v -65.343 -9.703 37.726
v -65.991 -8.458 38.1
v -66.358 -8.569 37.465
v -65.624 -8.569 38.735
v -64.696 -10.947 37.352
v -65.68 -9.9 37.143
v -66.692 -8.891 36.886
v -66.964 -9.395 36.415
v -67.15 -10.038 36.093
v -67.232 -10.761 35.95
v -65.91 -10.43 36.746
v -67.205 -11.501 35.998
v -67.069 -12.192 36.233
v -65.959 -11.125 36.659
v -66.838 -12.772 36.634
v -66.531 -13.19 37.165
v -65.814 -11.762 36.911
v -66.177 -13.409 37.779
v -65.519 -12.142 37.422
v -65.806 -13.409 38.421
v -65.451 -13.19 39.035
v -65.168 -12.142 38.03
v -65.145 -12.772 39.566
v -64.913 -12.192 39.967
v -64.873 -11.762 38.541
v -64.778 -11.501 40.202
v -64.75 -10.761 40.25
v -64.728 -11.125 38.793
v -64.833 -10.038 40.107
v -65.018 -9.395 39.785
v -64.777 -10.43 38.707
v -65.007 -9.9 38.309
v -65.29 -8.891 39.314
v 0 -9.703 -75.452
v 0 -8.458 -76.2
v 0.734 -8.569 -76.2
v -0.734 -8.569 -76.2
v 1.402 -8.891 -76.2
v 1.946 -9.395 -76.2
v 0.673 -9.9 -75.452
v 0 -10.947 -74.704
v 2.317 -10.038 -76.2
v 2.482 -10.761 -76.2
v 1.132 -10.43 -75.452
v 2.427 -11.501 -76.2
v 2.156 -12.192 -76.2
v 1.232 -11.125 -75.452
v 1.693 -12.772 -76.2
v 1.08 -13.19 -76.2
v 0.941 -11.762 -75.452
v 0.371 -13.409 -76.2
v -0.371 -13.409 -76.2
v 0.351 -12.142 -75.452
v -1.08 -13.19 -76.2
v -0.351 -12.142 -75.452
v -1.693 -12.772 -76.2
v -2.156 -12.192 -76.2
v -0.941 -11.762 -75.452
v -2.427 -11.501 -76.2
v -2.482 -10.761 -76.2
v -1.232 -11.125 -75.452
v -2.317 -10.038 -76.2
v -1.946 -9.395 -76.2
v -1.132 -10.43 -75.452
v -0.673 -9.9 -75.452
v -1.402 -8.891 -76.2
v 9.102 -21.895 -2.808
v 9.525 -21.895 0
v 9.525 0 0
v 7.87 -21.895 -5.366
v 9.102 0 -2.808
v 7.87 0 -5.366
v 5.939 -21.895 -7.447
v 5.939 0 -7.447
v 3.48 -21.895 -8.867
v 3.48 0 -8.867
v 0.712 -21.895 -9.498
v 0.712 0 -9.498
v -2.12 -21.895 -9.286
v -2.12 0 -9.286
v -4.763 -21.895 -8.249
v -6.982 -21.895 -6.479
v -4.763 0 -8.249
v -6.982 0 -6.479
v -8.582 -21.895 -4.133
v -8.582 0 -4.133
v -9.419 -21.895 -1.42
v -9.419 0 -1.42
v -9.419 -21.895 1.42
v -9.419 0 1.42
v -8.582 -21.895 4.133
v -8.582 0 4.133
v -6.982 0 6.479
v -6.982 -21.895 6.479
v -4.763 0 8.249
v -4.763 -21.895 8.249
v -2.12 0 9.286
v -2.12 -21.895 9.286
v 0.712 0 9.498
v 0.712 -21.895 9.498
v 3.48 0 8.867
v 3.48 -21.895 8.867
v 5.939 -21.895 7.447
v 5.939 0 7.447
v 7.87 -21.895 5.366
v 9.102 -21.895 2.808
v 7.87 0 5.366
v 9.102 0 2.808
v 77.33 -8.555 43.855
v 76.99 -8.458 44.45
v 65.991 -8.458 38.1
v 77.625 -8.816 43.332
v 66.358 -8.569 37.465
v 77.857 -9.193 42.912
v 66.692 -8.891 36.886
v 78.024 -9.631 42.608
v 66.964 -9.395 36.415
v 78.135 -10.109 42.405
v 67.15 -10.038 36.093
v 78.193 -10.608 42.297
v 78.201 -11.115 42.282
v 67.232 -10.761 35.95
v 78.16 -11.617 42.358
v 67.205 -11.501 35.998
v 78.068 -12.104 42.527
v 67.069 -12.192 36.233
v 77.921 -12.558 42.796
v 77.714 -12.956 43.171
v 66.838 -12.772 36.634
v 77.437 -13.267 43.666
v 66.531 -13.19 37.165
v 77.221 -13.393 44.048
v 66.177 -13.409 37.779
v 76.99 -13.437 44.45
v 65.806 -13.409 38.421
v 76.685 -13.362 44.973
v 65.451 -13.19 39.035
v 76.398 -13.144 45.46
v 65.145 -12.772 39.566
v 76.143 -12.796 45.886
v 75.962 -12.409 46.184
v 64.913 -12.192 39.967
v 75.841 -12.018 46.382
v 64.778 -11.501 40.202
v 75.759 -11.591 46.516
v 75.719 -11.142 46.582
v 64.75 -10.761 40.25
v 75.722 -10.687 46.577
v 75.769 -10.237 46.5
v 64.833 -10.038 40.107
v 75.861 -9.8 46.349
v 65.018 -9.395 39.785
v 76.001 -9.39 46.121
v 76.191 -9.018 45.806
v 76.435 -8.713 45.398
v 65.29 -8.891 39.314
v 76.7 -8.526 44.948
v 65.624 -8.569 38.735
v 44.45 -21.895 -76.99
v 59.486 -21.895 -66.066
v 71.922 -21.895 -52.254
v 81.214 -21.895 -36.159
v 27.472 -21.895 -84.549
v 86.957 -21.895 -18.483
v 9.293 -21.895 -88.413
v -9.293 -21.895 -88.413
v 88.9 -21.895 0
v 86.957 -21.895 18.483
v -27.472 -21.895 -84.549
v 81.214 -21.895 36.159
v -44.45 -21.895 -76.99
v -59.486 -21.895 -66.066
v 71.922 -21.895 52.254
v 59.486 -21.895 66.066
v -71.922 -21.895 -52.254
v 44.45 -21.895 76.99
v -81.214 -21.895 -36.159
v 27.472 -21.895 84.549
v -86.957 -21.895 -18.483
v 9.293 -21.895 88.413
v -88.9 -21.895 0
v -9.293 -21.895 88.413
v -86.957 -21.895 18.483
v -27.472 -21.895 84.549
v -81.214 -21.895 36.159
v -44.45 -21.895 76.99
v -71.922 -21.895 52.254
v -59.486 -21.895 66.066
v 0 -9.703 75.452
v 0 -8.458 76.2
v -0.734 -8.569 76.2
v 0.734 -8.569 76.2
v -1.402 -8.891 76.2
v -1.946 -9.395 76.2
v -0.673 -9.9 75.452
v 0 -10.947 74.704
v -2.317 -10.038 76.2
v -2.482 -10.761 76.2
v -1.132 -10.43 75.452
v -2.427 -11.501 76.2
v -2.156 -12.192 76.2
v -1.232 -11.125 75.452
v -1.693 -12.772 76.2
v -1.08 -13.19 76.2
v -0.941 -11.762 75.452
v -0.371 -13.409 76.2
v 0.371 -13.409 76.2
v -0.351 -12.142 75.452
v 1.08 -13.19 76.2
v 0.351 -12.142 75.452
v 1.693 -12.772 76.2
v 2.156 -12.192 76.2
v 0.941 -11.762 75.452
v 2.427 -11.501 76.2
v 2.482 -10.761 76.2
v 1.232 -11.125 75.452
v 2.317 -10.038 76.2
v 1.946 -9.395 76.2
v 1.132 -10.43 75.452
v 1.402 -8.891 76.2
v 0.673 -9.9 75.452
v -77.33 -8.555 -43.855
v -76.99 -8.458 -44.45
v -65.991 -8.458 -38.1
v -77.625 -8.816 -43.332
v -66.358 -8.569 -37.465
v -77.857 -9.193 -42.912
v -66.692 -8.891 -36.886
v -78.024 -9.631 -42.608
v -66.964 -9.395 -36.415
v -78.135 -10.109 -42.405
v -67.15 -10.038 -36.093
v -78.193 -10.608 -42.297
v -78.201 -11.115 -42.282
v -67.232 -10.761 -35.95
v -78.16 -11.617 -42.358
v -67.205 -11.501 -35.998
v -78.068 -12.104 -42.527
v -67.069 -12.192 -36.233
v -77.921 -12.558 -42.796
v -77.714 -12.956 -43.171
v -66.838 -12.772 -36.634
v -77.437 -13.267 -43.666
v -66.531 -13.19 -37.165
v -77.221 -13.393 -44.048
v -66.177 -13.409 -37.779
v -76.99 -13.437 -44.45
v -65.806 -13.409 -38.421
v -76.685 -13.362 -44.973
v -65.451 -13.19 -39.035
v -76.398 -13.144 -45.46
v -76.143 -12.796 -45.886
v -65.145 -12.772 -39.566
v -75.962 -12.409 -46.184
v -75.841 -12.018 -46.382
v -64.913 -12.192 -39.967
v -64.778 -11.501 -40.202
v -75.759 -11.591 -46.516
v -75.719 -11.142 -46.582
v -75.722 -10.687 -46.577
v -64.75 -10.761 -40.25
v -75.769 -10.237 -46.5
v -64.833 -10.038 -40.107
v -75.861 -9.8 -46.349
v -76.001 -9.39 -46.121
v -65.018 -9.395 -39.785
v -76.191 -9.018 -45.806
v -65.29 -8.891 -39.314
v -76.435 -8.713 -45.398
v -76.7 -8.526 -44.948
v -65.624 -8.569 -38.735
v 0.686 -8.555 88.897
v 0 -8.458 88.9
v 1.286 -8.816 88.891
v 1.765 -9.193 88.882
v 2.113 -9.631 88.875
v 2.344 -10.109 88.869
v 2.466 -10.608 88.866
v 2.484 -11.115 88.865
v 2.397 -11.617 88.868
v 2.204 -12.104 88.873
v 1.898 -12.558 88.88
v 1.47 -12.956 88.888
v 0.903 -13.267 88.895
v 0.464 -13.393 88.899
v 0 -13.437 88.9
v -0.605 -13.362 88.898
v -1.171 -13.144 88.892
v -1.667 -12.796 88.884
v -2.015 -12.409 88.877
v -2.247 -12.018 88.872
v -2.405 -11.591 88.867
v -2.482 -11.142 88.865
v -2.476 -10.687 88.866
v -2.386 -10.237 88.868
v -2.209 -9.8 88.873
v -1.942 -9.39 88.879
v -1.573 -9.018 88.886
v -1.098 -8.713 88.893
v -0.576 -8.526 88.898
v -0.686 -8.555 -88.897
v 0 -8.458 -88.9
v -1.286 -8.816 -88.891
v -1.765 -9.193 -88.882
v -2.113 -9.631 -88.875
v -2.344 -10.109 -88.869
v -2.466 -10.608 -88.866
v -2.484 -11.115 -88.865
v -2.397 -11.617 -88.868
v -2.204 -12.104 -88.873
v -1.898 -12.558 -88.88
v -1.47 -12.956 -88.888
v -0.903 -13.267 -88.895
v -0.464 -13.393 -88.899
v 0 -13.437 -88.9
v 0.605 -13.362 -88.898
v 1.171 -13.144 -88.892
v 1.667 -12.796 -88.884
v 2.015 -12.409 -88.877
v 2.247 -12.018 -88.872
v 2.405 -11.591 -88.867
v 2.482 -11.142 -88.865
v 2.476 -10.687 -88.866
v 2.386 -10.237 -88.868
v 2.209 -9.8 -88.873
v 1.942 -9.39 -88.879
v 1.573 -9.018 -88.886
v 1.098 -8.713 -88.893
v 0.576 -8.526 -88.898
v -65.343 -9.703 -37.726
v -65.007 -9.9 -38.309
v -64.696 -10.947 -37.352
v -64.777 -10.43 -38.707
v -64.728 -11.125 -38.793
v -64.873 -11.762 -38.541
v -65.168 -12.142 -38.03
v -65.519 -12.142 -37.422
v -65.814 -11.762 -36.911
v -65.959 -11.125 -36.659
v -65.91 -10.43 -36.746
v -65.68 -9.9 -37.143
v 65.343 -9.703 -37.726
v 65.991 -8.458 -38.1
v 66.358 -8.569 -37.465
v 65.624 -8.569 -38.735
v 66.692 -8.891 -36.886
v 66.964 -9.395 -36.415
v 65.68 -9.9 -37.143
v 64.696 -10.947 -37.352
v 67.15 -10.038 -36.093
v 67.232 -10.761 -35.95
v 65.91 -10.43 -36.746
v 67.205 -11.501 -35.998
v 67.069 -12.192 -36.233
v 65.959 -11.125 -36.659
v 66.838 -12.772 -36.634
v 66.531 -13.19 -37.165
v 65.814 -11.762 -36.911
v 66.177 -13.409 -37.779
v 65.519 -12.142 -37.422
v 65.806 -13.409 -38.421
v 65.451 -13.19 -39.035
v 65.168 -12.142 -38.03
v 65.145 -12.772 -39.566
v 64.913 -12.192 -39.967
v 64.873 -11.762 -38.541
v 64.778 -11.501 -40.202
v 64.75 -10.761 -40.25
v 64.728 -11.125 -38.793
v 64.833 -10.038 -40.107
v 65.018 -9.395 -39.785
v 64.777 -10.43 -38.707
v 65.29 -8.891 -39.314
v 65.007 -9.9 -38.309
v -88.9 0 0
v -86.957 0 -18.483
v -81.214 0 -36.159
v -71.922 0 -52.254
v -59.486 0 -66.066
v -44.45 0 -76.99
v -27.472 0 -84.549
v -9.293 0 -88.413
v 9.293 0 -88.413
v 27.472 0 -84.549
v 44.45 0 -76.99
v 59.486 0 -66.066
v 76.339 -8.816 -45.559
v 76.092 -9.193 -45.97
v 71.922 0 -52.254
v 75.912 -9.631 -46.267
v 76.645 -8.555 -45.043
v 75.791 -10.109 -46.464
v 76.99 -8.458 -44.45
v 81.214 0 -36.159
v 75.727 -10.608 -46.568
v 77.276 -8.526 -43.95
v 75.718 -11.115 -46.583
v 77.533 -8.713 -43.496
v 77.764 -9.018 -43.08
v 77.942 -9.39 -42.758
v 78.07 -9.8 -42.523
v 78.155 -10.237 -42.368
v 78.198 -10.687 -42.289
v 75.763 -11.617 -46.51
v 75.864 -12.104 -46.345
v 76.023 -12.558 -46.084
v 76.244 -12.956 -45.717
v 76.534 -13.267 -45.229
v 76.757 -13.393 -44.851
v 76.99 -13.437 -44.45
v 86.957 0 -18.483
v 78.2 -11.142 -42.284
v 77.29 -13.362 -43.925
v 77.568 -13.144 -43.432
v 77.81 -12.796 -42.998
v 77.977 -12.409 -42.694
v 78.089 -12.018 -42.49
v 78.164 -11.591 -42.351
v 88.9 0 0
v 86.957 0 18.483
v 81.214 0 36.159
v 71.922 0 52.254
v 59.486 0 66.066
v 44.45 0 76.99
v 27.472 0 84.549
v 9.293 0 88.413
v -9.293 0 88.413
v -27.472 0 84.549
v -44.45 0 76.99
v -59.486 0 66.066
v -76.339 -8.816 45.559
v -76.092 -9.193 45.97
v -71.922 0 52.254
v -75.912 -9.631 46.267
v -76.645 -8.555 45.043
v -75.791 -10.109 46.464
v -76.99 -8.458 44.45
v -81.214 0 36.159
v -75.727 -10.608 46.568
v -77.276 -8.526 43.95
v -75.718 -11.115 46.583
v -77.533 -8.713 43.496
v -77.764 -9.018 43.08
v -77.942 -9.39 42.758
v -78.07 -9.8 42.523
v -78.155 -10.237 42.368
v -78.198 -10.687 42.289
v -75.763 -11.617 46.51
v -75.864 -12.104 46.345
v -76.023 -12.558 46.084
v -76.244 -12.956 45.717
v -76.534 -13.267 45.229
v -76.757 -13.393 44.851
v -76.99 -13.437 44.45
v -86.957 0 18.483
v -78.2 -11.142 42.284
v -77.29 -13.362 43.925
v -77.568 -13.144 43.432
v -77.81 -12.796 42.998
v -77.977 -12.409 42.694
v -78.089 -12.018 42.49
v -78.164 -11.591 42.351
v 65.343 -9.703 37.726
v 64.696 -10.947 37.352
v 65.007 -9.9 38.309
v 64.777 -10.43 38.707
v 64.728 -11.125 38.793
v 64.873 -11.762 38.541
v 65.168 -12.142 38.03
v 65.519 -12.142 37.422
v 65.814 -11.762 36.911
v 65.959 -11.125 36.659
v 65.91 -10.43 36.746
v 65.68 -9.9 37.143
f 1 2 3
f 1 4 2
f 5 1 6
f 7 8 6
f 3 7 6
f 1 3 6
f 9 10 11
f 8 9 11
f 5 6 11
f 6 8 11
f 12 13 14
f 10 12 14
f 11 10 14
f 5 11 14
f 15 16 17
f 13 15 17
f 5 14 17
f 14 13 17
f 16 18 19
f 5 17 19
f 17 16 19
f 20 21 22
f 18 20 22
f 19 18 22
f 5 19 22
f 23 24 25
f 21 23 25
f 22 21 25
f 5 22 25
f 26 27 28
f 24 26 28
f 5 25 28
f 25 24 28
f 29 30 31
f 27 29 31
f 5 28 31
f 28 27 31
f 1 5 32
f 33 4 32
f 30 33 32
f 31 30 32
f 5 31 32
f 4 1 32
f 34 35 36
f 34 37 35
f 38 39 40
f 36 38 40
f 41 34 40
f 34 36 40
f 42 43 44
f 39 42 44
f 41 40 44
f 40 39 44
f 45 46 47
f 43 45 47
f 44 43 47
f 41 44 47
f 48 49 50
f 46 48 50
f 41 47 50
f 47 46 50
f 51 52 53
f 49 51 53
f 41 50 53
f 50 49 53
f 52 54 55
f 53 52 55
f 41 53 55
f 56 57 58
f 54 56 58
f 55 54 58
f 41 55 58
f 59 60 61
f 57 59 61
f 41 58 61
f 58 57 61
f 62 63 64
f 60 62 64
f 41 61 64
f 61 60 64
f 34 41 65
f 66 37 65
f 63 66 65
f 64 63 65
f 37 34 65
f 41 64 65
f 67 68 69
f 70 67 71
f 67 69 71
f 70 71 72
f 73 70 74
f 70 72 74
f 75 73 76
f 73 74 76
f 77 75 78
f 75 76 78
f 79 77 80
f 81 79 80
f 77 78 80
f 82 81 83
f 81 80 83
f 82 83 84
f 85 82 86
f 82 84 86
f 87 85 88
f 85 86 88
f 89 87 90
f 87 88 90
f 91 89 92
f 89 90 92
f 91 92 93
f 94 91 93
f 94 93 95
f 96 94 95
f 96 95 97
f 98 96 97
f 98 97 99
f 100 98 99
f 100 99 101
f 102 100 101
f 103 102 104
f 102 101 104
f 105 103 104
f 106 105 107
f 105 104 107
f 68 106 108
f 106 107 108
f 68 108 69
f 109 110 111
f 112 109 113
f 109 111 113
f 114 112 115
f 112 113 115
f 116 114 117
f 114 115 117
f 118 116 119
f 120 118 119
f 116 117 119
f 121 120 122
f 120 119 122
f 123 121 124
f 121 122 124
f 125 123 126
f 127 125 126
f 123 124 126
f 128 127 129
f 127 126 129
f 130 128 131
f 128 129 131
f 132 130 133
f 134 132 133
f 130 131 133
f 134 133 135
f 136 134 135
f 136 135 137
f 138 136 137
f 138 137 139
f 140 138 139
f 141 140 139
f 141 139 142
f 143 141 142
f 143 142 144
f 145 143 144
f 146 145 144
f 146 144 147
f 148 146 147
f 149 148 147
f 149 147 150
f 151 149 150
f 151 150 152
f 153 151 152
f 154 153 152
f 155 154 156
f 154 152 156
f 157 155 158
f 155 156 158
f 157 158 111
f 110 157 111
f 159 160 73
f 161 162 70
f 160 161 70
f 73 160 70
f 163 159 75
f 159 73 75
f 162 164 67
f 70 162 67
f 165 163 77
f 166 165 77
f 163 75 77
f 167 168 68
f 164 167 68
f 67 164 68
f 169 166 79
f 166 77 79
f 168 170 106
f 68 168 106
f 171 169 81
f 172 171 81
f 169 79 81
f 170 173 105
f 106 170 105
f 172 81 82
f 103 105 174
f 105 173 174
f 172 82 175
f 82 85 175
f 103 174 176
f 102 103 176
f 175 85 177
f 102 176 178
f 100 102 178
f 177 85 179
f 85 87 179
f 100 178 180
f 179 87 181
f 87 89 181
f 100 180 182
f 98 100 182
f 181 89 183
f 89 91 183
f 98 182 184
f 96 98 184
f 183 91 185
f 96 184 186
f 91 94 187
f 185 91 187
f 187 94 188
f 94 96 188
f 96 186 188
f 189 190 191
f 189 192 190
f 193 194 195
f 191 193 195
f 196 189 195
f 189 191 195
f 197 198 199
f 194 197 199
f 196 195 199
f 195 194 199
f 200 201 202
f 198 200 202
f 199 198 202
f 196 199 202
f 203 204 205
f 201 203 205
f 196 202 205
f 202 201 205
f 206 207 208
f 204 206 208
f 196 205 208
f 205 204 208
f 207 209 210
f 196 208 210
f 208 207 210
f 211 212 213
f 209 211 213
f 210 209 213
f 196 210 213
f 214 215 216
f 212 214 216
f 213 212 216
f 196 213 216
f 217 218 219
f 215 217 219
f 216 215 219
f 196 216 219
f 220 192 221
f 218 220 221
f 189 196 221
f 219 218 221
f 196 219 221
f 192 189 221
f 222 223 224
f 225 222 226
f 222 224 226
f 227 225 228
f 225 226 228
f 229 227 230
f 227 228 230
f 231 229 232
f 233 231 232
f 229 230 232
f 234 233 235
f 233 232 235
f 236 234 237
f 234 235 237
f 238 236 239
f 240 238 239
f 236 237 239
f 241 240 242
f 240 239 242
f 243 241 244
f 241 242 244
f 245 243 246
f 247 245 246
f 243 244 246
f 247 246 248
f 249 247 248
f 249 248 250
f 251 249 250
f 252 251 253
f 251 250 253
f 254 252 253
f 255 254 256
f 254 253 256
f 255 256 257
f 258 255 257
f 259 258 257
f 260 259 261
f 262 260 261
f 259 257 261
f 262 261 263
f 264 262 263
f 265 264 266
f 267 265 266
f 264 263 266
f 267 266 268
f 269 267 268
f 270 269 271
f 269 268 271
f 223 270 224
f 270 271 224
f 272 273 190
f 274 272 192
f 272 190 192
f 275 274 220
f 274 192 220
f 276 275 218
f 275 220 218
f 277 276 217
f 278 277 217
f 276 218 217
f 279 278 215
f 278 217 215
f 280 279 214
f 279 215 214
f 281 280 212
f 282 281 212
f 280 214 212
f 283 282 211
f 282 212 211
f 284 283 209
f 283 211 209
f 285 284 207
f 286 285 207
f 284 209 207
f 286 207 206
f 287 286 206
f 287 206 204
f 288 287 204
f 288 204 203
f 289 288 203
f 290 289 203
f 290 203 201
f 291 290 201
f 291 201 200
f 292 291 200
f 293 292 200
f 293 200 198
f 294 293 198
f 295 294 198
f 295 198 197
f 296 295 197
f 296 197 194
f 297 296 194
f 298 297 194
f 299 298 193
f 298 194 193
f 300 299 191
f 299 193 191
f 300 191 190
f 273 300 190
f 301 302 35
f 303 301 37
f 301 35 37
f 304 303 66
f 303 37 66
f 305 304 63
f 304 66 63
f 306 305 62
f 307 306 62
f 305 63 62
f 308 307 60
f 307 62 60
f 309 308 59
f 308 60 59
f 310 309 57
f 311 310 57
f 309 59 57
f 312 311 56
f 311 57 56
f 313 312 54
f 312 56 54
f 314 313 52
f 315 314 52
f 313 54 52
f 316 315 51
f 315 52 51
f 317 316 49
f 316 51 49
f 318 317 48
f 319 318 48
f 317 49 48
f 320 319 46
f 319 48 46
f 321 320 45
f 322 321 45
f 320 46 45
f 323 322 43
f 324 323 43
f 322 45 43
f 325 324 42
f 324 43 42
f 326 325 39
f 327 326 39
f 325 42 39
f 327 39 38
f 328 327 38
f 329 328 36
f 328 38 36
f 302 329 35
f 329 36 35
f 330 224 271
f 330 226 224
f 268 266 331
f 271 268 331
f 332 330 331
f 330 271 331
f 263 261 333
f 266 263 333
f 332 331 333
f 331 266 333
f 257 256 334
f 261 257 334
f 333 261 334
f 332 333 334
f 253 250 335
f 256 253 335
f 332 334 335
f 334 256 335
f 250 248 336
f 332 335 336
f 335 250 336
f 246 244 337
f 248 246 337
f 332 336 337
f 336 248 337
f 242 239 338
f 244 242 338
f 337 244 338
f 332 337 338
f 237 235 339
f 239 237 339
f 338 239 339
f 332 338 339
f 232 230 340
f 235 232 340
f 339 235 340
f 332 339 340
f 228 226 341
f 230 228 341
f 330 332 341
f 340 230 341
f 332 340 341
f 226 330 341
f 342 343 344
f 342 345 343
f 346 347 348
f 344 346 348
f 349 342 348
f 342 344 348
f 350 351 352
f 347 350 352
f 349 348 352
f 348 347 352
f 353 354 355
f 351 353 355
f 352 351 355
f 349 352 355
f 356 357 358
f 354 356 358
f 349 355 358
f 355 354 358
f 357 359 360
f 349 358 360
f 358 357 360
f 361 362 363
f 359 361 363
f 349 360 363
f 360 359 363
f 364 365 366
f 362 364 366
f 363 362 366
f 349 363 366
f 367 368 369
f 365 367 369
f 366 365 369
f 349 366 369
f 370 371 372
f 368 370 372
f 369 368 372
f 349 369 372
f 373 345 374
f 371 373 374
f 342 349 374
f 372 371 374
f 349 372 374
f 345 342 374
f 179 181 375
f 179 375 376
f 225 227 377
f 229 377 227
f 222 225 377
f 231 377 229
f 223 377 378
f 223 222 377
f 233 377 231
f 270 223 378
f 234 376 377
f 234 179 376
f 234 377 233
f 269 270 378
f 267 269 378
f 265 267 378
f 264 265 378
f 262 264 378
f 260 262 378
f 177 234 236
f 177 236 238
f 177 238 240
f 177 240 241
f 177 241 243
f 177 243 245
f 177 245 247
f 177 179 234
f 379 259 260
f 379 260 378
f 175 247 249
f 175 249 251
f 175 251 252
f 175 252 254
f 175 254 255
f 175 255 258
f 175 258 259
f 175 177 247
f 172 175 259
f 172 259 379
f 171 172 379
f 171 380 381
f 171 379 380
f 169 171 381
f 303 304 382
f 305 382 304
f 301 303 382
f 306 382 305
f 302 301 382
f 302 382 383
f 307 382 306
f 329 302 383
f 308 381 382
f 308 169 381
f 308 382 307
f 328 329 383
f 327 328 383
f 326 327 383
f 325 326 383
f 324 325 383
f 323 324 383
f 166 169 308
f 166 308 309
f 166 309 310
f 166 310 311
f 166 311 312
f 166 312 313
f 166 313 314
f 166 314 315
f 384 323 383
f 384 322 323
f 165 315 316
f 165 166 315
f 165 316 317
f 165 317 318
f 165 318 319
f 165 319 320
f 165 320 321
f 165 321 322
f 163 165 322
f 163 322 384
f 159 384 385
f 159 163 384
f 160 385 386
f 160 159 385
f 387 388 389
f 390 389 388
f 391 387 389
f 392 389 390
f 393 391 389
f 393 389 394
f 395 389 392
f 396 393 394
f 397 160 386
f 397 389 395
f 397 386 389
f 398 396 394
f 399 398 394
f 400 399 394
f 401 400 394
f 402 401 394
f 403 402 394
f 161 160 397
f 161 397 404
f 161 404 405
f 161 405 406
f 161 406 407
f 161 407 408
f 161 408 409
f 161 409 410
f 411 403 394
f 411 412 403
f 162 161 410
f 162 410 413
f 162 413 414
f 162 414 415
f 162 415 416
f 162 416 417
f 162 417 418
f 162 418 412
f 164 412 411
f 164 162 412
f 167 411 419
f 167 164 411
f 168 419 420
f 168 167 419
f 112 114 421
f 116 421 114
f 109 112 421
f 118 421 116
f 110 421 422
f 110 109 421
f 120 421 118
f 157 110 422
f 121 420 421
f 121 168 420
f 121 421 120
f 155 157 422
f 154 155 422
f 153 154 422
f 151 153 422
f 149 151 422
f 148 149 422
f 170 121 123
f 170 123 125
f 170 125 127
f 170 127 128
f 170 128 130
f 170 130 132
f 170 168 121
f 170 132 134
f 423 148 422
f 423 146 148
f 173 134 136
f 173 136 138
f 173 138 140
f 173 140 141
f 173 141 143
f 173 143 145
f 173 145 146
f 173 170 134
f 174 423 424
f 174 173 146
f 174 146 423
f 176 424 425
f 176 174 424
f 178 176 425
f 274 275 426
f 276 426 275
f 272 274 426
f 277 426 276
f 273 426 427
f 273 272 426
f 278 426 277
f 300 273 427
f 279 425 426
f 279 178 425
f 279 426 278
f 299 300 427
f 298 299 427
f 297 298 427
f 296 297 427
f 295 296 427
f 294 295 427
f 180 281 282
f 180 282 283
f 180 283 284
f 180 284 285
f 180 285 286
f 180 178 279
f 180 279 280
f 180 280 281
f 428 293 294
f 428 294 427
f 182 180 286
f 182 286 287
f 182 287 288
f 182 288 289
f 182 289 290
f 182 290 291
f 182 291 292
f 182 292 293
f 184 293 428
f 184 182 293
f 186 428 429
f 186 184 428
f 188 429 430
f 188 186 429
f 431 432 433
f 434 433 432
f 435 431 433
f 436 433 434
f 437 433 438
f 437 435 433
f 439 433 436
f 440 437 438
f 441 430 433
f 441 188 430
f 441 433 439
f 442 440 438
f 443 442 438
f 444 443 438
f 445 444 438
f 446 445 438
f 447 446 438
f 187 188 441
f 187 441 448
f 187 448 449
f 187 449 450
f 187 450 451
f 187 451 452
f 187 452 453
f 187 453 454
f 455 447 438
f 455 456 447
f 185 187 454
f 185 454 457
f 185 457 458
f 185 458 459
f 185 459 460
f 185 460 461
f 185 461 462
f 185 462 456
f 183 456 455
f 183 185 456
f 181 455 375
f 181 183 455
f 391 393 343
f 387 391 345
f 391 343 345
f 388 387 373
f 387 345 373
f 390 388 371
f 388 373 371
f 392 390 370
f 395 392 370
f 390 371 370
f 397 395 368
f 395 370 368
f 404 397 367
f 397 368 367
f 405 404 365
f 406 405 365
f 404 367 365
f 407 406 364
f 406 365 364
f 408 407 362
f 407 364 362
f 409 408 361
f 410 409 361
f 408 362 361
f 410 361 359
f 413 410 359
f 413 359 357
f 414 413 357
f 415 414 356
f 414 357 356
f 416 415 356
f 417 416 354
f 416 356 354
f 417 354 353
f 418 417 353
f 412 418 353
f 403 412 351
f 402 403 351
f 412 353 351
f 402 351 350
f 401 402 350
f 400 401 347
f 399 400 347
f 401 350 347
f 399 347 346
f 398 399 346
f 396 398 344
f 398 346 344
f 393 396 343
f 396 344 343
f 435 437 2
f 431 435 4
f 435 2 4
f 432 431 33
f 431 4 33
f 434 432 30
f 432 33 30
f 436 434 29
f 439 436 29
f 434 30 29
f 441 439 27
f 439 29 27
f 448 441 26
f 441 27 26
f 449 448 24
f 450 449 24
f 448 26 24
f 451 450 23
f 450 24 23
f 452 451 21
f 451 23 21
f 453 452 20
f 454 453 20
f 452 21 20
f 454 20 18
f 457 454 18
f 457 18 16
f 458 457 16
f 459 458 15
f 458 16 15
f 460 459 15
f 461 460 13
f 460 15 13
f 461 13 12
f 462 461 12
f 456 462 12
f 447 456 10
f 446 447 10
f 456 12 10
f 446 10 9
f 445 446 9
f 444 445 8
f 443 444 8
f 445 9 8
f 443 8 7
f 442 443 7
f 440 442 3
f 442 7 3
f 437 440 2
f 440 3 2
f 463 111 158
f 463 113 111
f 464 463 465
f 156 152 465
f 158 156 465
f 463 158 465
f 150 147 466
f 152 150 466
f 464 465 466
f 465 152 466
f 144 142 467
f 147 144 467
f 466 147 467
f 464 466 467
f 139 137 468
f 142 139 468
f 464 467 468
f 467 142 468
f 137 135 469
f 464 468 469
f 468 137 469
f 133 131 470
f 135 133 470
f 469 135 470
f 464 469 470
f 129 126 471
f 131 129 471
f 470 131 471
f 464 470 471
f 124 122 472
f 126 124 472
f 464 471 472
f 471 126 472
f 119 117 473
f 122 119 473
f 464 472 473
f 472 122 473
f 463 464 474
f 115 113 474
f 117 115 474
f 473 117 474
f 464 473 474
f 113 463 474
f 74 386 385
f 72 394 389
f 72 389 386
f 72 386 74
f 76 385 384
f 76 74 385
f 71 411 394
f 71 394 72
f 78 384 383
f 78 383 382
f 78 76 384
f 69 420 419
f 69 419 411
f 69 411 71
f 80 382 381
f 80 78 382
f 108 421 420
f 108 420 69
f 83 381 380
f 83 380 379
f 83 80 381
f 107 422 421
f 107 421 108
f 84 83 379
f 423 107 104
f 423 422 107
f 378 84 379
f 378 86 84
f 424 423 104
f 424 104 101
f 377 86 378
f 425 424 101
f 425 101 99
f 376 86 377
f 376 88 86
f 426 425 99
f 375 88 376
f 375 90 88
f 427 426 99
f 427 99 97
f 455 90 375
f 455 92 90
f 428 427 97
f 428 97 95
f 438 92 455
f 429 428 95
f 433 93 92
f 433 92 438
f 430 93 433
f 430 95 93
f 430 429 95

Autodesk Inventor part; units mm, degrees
ref_plane "YZ Plane" through (0, 0, 0) normal (1, 0, 0) x (0, 1, 0)
ref_plane "XZ Plane" through (0, 0, 0) normal (0, 1, 0) x (-1, 0, 0)
sketch "Sketch1" plane through (0, 0, 0) normal (0, 0, 1) x (1, 0, 0)
  line L0 (0, 0) -> (-88.9, 0)
  line L1 (-153.7877, 0) -> (0, 0)
  line L2 (-88.9, 0) -> (-88.9, -21.8948)
  line L3 (-88.9, -21.8948) -> (0, -21.8948)
  line L4 (0, -21.8948) -> (0, 0)
  dimension "d0" = 88.9
  dimension "d1" = 21.8948
revolve "Revolution1" add sketch "Sketch1" angle 360 about axis through (0, -21.8948, 0) along (0, 1, 0)
ref_plane "Work Plane1" through (0, -10.9474, -88.9) normal (0, 0, 1) x (1, 0, 0)
sketch "Sketch2" plane through (0, -10.9474, -88.9) normal (0, 0, 1) x (1, 0, 0)
  line L0 (0, 10.9474) -> (0, 0)
  dimension "d3" = 10.9474
hole "Hole1" at (0, -10.9474, -88.9) direction (0, 0, 1) diameter 4.9784 depth 12.7 tip angle 118 thread size "1/4-20 UNC" class "2B" standard "ANSI Unified Screw Threads"
pattern_circular "Circular Pattern1" count 6 over 360 about axis through (0, -10, 0) along (0, 1, 0) of "Hole1"
sketch "Sketch3" plane through (0, 0, 0) normal (0, 1, 0) x (1, 0, 0)
  circle A0 centre (0, 0) radius 9.525
  point P0 (0, 0)
  dimension "d14" = 19.05
extrude "Extrusion1" cut sketch "Sketch3" against normal blind 74.6125
properties part number "Avi Bay phenolic" material "Phenolic Resin"
